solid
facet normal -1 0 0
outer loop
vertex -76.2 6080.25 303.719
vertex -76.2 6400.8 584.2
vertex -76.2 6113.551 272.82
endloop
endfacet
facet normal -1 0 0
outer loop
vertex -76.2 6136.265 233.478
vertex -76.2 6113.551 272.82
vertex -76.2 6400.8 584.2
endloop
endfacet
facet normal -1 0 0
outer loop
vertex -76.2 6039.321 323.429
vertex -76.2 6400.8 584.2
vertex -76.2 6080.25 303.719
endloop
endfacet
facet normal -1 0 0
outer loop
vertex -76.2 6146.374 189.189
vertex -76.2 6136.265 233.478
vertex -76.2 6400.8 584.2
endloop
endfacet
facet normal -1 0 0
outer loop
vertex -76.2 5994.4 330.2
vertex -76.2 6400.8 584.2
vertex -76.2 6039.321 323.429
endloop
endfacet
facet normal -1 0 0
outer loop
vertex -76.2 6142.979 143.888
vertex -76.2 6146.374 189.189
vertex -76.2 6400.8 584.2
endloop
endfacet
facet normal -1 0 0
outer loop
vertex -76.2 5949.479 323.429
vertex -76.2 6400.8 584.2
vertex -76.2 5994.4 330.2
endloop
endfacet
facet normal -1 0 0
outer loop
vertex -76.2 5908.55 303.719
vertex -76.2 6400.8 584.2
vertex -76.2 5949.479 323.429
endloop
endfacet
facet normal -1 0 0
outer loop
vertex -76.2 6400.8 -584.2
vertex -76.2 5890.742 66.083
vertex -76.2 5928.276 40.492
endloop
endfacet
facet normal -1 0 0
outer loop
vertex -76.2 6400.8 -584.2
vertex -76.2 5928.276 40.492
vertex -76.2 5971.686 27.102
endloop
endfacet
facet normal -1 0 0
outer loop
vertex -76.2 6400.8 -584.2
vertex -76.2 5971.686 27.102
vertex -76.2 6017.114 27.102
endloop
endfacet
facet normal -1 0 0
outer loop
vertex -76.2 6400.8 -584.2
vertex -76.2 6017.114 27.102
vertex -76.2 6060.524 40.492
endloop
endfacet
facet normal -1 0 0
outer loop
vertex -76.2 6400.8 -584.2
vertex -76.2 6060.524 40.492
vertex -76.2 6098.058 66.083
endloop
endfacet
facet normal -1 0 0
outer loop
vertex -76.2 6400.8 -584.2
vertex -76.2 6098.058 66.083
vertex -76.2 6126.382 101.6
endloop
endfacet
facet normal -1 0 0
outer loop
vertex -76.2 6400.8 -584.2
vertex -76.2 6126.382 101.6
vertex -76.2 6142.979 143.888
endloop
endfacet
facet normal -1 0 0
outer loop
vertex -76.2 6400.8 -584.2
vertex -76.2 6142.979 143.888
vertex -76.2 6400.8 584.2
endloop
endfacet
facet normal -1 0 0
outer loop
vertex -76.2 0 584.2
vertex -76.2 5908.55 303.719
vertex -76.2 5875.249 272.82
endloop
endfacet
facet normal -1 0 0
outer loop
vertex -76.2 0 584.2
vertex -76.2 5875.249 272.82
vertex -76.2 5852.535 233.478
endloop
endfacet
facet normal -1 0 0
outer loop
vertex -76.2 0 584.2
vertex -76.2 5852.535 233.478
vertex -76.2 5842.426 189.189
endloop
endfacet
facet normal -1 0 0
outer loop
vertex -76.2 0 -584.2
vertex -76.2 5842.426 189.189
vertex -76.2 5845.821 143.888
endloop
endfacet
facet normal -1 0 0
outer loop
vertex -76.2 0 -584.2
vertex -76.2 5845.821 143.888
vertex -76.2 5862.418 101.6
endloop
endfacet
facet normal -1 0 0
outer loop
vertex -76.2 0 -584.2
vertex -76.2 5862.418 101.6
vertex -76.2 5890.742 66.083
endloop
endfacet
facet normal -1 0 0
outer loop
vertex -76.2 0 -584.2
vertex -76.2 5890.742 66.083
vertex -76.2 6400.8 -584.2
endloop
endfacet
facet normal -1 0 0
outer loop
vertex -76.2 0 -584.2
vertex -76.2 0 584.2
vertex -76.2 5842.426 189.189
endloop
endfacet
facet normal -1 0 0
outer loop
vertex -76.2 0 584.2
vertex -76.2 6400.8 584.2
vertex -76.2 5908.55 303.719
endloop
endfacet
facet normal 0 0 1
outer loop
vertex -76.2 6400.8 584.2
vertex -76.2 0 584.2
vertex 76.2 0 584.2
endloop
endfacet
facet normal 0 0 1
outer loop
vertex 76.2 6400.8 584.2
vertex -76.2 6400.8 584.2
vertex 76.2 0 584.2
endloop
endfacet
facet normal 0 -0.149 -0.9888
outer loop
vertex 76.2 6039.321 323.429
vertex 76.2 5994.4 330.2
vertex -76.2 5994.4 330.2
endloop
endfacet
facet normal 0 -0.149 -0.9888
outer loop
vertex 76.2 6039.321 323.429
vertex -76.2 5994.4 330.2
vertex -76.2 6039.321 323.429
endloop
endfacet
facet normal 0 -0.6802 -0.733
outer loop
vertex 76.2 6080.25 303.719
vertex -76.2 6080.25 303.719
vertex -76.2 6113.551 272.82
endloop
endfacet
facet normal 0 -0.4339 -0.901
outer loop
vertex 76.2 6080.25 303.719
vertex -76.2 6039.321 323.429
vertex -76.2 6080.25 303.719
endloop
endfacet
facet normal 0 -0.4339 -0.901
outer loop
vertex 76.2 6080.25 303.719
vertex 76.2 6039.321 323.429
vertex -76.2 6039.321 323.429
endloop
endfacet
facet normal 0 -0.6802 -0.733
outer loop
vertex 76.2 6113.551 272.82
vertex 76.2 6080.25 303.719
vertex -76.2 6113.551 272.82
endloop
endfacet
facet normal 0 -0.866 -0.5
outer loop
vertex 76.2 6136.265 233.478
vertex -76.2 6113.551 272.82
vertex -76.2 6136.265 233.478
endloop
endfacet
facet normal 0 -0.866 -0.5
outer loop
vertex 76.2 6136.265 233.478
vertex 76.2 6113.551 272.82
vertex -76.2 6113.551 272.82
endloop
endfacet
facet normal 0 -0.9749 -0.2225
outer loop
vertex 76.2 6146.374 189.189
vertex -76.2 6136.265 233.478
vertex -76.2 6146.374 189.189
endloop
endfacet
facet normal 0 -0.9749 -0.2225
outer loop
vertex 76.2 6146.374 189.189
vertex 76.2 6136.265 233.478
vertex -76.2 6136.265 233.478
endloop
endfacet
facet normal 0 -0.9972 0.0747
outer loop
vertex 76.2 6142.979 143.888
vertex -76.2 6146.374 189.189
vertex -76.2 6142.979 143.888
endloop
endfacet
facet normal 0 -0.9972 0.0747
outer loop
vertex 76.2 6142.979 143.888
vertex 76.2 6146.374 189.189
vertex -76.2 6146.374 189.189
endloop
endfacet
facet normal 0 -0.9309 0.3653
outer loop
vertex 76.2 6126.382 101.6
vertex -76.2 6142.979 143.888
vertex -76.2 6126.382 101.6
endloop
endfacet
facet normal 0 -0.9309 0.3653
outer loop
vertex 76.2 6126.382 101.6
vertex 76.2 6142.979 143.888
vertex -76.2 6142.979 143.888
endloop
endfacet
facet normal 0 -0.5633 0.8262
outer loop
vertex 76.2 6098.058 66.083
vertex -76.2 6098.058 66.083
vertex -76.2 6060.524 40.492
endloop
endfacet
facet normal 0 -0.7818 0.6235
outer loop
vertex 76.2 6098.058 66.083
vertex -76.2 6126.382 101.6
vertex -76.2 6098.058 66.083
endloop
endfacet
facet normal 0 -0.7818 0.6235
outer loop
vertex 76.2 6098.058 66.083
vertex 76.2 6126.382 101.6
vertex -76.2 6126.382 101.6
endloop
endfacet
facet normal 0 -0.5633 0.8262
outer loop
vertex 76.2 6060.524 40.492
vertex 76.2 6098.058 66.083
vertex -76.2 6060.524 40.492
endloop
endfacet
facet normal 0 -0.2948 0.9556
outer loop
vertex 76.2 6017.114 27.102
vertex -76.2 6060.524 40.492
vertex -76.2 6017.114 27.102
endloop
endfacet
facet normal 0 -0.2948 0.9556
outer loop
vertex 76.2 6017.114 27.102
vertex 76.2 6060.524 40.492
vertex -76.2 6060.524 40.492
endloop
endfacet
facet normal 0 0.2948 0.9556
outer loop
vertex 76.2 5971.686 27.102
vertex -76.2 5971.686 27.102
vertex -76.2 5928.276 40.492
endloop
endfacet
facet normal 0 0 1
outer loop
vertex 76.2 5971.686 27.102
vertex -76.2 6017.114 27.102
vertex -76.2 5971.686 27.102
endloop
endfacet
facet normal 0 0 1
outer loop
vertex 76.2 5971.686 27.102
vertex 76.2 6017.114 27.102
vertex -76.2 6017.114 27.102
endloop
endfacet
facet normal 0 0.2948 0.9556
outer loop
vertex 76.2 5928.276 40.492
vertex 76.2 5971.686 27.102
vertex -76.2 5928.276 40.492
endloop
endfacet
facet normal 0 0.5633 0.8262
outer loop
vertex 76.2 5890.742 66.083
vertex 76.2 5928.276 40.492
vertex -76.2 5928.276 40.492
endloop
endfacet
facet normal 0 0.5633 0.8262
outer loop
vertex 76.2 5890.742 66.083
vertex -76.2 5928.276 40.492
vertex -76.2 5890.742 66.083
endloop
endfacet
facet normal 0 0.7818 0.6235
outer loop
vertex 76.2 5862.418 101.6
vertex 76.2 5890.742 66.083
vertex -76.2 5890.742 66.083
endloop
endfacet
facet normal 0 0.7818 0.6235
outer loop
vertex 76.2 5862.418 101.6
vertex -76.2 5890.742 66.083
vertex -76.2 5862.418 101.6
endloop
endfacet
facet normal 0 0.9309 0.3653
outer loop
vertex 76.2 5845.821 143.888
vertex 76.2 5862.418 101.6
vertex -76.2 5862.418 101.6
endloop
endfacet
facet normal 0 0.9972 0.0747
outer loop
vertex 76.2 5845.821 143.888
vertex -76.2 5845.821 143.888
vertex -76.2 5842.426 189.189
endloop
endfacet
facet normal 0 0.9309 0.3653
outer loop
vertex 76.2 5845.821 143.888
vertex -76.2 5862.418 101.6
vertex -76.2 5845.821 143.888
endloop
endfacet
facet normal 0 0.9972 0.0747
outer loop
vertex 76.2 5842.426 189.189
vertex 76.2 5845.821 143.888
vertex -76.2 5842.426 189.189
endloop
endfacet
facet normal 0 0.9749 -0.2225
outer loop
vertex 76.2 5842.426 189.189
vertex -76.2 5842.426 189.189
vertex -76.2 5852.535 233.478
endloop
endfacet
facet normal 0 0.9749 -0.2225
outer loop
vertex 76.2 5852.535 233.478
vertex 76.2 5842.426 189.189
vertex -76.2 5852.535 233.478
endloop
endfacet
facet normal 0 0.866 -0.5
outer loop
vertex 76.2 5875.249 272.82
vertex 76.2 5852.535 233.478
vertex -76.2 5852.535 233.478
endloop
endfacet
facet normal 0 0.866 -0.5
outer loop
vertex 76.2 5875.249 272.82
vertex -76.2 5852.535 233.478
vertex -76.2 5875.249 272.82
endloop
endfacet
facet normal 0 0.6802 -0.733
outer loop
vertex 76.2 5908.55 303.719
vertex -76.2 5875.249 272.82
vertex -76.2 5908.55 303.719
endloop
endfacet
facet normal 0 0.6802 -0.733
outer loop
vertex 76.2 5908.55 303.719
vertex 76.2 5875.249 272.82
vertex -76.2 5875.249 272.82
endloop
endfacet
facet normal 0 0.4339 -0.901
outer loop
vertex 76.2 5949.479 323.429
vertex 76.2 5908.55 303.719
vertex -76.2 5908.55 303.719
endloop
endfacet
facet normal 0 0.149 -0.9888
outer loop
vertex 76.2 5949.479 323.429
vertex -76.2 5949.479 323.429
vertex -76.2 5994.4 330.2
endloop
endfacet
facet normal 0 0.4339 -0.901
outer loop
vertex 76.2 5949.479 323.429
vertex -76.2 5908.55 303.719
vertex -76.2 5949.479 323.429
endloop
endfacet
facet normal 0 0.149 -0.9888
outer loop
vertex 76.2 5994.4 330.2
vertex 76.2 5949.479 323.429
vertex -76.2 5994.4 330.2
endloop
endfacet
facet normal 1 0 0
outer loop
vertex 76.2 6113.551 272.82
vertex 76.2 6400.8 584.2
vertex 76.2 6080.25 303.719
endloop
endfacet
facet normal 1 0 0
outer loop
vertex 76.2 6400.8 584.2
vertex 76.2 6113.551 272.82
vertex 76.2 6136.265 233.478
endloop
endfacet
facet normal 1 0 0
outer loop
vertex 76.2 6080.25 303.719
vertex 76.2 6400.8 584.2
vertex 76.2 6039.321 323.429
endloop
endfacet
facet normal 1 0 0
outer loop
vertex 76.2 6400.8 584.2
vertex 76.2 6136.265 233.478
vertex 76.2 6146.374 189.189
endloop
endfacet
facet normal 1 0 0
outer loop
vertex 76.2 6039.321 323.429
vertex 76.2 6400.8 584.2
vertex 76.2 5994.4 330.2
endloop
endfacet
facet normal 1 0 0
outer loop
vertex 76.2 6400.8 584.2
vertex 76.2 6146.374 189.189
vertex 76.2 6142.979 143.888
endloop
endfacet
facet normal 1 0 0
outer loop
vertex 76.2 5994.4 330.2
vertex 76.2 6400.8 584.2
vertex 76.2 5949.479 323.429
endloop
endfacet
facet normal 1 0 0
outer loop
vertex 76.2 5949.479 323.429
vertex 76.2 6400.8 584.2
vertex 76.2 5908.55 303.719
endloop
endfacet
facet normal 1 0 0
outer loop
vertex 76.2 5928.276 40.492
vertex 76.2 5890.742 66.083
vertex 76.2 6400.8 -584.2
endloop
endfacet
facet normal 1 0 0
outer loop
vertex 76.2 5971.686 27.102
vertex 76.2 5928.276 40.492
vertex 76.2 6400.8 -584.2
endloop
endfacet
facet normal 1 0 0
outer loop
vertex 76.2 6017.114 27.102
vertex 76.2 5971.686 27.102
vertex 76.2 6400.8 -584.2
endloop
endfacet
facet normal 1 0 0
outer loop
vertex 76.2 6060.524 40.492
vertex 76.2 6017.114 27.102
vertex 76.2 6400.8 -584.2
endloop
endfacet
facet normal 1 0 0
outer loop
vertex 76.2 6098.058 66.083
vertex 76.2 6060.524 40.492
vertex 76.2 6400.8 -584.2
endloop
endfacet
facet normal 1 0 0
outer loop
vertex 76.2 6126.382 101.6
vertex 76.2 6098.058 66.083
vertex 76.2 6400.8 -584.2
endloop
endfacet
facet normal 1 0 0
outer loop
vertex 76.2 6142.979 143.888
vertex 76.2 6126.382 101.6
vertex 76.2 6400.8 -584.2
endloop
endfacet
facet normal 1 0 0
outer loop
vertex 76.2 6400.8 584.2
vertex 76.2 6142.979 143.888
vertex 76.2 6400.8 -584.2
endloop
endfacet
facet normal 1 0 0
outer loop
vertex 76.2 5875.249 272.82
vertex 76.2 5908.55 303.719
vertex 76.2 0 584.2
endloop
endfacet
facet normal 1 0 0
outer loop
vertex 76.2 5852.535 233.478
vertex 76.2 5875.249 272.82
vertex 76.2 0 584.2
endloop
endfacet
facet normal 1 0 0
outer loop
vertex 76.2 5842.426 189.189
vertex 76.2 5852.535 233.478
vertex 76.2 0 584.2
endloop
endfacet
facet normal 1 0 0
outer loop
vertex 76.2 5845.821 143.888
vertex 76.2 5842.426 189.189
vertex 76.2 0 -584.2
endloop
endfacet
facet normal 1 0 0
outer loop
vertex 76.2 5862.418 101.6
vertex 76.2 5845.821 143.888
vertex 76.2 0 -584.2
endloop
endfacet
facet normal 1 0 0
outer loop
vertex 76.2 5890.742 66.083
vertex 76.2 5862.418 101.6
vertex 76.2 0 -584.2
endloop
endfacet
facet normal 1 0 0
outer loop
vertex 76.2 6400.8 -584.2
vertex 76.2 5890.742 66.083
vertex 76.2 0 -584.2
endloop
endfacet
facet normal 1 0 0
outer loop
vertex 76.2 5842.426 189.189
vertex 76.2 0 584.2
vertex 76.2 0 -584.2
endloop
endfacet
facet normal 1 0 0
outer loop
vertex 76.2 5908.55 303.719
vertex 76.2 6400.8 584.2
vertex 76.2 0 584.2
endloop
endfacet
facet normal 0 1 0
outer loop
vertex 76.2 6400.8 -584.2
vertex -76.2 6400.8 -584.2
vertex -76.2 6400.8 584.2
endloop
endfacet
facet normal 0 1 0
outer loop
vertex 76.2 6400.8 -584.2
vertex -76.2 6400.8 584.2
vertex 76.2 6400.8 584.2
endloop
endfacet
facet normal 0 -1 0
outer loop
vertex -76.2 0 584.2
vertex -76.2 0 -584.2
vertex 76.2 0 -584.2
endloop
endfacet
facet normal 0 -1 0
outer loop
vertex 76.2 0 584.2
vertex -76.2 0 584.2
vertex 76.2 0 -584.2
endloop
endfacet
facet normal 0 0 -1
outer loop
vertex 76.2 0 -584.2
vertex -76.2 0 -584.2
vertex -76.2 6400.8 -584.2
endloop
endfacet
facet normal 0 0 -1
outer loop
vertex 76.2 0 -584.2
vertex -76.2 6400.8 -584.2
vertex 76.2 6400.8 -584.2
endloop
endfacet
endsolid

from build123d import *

# Parameters (mm, degrees)
SKETCH1_W               = 152.4
SKETCH1_H               = 1168.4
BOSS_EXTRUDE1_DEPTH     = 6400.8
CUT_EXTRUDE3_DEPTH      = 6430.211152233
CUT_EXTRUDE3_DEPTH_BACK = 6430.211152233
SKETCH4_R               = 152.4


with BuildPart() as part:
    # Sketch1 → Boss-Extrude1 (new body)
    with BuildSketch(Plane(origin=(0, 0, 0), x_dir=(1, 0, 0), z_dir=(0, 1, 0))):
        Rectangle(SKETCH1_W, SKETCH1_H)
    extrude(amount=BOSS_EXTRUDE1_DEPTH)

    # Sketch4 → Cut-Extrude3 (cut, two sides: drawn at the far end of the back side and taken through both)
    with BuildSketch(Plane.ZY.offset(76.2).offset(-CUT_EXTRUDE3_DEPTH_BACK)):
        with Locations((177.8, 5994.4)):
            Circle(SKETCH4_R)
    extrude(amount=CUT_EXTRUDE3_DEPTH + CUT_EXTRUDE3_DEPTH_BACK, mode=Mode.SUBTRACT)


solid = part.part
